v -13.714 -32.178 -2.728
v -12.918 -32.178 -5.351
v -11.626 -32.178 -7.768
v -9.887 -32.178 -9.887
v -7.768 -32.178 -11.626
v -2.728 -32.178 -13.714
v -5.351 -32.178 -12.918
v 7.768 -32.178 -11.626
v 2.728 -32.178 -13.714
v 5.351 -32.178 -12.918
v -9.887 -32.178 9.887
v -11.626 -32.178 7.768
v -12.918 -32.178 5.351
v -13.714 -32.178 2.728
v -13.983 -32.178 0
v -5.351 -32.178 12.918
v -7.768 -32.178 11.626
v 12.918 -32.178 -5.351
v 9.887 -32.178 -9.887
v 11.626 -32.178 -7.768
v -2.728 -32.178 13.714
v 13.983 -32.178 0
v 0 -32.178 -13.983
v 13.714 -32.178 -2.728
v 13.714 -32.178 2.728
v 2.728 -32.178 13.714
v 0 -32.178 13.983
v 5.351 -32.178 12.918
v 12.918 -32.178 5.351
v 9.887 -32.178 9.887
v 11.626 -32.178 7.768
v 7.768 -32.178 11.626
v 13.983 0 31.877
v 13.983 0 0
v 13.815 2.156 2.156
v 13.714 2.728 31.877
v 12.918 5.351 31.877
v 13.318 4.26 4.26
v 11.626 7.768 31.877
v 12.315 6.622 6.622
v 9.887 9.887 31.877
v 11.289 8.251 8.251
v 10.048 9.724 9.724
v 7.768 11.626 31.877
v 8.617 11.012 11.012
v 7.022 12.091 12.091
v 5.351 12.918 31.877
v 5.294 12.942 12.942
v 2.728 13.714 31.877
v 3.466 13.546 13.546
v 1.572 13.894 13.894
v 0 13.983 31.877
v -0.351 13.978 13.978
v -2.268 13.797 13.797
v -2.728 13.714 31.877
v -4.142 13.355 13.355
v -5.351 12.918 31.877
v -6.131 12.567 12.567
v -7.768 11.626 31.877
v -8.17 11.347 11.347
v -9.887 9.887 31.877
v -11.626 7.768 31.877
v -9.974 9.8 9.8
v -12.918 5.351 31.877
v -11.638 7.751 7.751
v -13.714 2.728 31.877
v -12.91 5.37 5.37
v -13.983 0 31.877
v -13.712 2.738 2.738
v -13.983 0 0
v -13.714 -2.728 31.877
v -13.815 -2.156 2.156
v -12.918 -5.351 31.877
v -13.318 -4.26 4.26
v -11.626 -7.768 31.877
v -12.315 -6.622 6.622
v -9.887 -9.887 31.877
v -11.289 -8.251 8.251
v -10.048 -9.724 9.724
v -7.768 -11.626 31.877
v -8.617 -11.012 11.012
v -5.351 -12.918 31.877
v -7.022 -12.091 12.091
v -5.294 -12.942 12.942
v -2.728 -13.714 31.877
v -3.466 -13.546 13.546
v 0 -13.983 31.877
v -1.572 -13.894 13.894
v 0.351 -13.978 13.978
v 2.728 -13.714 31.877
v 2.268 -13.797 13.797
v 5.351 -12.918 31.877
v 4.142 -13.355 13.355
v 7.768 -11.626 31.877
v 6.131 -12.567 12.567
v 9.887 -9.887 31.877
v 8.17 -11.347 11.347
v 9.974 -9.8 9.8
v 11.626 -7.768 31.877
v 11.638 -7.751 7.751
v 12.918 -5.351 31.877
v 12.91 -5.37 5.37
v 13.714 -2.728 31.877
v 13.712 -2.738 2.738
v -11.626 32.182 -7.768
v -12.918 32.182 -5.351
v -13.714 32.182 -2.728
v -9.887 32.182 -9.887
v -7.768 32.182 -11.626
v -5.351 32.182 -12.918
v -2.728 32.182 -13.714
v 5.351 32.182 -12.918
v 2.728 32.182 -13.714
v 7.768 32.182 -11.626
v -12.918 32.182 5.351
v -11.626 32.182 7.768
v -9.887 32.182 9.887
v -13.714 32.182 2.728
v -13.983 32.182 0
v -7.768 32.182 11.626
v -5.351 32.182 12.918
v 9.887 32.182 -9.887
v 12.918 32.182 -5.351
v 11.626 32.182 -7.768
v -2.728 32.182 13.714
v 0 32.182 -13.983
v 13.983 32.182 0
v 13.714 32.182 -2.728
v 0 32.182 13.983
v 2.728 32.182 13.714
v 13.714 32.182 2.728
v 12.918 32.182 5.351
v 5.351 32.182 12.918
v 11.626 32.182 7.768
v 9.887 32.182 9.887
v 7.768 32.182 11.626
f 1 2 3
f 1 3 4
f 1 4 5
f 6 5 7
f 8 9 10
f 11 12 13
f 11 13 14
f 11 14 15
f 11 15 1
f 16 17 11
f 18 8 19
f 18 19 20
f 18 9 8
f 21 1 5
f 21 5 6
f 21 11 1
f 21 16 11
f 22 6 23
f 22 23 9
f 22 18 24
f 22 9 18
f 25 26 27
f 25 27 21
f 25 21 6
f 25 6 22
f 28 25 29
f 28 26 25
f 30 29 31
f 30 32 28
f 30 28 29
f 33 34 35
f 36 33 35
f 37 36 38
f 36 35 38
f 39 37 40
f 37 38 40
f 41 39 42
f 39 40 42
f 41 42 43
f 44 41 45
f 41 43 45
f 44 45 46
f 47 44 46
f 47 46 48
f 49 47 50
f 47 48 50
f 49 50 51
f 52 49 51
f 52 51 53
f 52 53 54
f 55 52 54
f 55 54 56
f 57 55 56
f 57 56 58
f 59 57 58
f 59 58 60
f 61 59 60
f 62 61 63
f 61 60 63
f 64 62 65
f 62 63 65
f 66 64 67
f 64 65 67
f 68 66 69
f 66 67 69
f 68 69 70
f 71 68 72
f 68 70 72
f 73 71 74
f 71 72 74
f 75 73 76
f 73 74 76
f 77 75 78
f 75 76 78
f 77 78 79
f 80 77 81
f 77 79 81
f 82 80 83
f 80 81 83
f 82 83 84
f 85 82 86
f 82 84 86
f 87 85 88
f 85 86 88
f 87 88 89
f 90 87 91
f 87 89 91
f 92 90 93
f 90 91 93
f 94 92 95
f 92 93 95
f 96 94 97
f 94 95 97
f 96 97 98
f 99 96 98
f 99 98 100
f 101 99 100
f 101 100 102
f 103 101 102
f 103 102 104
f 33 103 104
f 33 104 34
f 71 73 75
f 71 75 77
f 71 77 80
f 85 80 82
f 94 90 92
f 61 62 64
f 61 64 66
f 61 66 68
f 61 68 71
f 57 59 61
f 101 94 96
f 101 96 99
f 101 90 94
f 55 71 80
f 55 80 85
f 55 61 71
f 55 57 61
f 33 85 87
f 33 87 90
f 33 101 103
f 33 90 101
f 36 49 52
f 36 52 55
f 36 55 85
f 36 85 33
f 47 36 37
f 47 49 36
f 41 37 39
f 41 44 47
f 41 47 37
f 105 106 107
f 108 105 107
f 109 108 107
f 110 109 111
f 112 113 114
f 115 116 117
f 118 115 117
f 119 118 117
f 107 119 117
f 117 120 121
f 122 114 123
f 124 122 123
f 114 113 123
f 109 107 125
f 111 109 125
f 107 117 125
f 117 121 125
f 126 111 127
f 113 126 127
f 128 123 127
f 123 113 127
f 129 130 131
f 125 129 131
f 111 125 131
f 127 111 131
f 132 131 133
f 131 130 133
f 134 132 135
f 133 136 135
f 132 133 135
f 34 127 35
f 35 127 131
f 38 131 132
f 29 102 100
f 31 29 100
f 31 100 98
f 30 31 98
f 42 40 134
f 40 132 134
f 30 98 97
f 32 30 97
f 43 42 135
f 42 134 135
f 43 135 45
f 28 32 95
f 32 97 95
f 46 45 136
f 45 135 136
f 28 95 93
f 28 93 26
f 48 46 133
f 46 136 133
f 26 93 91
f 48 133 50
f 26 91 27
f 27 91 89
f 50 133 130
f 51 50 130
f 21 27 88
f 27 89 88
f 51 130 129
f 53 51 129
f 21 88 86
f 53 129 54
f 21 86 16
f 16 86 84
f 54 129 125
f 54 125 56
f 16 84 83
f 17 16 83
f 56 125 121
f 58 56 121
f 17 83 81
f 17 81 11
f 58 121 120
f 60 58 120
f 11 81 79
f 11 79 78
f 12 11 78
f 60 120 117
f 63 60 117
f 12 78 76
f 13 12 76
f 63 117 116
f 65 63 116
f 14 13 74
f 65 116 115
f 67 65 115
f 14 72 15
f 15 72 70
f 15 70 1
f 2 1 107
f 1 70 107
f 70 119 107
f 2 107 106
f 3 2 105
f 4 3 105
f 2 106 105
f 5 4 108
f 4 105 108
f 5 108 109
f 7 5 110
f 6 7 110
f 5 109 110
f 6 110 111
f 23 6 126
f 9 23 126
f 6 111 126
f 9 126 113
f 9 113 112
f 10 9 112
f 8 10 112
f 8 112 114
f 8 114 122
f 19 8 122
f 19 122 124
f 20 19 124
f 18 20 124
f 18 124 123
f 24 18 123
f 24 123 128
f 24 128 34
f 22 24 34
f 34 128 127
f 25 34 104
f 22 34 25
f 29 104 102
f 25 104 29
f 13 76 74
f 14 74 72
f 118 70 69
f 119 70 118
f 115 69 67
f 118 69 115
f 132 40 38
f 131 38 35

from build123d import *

# Parameters (mm, degrees)
CYLINDER007_R     = 13.9827
CYLINDER007_DEPTH = 64.36
CYLINDER006_R     = 13.9827
CYLINDER006_DEPTH = 31.877


with BuildPart() as cylinder007:
    # Cylinder007 → Cylinder007 (new body)
    with BuildSketch(Plane.XZ.offset(-32.1818)):
        Circle(CYLINDER007_R)
    extrude(amount=CYLINDER007_DEPTH)


with BuildPart() as t:
    # Cylinder006 → Cylinder006 (new body)
    with BuildSketch(Plane.XY):
        Circle(CYLINDER006_R)
    extrude(amount=CYLINDER006_DEPTH)

    # Fusion002: union Cylinder007
    add(cylinder007.part)


solid = t.part
